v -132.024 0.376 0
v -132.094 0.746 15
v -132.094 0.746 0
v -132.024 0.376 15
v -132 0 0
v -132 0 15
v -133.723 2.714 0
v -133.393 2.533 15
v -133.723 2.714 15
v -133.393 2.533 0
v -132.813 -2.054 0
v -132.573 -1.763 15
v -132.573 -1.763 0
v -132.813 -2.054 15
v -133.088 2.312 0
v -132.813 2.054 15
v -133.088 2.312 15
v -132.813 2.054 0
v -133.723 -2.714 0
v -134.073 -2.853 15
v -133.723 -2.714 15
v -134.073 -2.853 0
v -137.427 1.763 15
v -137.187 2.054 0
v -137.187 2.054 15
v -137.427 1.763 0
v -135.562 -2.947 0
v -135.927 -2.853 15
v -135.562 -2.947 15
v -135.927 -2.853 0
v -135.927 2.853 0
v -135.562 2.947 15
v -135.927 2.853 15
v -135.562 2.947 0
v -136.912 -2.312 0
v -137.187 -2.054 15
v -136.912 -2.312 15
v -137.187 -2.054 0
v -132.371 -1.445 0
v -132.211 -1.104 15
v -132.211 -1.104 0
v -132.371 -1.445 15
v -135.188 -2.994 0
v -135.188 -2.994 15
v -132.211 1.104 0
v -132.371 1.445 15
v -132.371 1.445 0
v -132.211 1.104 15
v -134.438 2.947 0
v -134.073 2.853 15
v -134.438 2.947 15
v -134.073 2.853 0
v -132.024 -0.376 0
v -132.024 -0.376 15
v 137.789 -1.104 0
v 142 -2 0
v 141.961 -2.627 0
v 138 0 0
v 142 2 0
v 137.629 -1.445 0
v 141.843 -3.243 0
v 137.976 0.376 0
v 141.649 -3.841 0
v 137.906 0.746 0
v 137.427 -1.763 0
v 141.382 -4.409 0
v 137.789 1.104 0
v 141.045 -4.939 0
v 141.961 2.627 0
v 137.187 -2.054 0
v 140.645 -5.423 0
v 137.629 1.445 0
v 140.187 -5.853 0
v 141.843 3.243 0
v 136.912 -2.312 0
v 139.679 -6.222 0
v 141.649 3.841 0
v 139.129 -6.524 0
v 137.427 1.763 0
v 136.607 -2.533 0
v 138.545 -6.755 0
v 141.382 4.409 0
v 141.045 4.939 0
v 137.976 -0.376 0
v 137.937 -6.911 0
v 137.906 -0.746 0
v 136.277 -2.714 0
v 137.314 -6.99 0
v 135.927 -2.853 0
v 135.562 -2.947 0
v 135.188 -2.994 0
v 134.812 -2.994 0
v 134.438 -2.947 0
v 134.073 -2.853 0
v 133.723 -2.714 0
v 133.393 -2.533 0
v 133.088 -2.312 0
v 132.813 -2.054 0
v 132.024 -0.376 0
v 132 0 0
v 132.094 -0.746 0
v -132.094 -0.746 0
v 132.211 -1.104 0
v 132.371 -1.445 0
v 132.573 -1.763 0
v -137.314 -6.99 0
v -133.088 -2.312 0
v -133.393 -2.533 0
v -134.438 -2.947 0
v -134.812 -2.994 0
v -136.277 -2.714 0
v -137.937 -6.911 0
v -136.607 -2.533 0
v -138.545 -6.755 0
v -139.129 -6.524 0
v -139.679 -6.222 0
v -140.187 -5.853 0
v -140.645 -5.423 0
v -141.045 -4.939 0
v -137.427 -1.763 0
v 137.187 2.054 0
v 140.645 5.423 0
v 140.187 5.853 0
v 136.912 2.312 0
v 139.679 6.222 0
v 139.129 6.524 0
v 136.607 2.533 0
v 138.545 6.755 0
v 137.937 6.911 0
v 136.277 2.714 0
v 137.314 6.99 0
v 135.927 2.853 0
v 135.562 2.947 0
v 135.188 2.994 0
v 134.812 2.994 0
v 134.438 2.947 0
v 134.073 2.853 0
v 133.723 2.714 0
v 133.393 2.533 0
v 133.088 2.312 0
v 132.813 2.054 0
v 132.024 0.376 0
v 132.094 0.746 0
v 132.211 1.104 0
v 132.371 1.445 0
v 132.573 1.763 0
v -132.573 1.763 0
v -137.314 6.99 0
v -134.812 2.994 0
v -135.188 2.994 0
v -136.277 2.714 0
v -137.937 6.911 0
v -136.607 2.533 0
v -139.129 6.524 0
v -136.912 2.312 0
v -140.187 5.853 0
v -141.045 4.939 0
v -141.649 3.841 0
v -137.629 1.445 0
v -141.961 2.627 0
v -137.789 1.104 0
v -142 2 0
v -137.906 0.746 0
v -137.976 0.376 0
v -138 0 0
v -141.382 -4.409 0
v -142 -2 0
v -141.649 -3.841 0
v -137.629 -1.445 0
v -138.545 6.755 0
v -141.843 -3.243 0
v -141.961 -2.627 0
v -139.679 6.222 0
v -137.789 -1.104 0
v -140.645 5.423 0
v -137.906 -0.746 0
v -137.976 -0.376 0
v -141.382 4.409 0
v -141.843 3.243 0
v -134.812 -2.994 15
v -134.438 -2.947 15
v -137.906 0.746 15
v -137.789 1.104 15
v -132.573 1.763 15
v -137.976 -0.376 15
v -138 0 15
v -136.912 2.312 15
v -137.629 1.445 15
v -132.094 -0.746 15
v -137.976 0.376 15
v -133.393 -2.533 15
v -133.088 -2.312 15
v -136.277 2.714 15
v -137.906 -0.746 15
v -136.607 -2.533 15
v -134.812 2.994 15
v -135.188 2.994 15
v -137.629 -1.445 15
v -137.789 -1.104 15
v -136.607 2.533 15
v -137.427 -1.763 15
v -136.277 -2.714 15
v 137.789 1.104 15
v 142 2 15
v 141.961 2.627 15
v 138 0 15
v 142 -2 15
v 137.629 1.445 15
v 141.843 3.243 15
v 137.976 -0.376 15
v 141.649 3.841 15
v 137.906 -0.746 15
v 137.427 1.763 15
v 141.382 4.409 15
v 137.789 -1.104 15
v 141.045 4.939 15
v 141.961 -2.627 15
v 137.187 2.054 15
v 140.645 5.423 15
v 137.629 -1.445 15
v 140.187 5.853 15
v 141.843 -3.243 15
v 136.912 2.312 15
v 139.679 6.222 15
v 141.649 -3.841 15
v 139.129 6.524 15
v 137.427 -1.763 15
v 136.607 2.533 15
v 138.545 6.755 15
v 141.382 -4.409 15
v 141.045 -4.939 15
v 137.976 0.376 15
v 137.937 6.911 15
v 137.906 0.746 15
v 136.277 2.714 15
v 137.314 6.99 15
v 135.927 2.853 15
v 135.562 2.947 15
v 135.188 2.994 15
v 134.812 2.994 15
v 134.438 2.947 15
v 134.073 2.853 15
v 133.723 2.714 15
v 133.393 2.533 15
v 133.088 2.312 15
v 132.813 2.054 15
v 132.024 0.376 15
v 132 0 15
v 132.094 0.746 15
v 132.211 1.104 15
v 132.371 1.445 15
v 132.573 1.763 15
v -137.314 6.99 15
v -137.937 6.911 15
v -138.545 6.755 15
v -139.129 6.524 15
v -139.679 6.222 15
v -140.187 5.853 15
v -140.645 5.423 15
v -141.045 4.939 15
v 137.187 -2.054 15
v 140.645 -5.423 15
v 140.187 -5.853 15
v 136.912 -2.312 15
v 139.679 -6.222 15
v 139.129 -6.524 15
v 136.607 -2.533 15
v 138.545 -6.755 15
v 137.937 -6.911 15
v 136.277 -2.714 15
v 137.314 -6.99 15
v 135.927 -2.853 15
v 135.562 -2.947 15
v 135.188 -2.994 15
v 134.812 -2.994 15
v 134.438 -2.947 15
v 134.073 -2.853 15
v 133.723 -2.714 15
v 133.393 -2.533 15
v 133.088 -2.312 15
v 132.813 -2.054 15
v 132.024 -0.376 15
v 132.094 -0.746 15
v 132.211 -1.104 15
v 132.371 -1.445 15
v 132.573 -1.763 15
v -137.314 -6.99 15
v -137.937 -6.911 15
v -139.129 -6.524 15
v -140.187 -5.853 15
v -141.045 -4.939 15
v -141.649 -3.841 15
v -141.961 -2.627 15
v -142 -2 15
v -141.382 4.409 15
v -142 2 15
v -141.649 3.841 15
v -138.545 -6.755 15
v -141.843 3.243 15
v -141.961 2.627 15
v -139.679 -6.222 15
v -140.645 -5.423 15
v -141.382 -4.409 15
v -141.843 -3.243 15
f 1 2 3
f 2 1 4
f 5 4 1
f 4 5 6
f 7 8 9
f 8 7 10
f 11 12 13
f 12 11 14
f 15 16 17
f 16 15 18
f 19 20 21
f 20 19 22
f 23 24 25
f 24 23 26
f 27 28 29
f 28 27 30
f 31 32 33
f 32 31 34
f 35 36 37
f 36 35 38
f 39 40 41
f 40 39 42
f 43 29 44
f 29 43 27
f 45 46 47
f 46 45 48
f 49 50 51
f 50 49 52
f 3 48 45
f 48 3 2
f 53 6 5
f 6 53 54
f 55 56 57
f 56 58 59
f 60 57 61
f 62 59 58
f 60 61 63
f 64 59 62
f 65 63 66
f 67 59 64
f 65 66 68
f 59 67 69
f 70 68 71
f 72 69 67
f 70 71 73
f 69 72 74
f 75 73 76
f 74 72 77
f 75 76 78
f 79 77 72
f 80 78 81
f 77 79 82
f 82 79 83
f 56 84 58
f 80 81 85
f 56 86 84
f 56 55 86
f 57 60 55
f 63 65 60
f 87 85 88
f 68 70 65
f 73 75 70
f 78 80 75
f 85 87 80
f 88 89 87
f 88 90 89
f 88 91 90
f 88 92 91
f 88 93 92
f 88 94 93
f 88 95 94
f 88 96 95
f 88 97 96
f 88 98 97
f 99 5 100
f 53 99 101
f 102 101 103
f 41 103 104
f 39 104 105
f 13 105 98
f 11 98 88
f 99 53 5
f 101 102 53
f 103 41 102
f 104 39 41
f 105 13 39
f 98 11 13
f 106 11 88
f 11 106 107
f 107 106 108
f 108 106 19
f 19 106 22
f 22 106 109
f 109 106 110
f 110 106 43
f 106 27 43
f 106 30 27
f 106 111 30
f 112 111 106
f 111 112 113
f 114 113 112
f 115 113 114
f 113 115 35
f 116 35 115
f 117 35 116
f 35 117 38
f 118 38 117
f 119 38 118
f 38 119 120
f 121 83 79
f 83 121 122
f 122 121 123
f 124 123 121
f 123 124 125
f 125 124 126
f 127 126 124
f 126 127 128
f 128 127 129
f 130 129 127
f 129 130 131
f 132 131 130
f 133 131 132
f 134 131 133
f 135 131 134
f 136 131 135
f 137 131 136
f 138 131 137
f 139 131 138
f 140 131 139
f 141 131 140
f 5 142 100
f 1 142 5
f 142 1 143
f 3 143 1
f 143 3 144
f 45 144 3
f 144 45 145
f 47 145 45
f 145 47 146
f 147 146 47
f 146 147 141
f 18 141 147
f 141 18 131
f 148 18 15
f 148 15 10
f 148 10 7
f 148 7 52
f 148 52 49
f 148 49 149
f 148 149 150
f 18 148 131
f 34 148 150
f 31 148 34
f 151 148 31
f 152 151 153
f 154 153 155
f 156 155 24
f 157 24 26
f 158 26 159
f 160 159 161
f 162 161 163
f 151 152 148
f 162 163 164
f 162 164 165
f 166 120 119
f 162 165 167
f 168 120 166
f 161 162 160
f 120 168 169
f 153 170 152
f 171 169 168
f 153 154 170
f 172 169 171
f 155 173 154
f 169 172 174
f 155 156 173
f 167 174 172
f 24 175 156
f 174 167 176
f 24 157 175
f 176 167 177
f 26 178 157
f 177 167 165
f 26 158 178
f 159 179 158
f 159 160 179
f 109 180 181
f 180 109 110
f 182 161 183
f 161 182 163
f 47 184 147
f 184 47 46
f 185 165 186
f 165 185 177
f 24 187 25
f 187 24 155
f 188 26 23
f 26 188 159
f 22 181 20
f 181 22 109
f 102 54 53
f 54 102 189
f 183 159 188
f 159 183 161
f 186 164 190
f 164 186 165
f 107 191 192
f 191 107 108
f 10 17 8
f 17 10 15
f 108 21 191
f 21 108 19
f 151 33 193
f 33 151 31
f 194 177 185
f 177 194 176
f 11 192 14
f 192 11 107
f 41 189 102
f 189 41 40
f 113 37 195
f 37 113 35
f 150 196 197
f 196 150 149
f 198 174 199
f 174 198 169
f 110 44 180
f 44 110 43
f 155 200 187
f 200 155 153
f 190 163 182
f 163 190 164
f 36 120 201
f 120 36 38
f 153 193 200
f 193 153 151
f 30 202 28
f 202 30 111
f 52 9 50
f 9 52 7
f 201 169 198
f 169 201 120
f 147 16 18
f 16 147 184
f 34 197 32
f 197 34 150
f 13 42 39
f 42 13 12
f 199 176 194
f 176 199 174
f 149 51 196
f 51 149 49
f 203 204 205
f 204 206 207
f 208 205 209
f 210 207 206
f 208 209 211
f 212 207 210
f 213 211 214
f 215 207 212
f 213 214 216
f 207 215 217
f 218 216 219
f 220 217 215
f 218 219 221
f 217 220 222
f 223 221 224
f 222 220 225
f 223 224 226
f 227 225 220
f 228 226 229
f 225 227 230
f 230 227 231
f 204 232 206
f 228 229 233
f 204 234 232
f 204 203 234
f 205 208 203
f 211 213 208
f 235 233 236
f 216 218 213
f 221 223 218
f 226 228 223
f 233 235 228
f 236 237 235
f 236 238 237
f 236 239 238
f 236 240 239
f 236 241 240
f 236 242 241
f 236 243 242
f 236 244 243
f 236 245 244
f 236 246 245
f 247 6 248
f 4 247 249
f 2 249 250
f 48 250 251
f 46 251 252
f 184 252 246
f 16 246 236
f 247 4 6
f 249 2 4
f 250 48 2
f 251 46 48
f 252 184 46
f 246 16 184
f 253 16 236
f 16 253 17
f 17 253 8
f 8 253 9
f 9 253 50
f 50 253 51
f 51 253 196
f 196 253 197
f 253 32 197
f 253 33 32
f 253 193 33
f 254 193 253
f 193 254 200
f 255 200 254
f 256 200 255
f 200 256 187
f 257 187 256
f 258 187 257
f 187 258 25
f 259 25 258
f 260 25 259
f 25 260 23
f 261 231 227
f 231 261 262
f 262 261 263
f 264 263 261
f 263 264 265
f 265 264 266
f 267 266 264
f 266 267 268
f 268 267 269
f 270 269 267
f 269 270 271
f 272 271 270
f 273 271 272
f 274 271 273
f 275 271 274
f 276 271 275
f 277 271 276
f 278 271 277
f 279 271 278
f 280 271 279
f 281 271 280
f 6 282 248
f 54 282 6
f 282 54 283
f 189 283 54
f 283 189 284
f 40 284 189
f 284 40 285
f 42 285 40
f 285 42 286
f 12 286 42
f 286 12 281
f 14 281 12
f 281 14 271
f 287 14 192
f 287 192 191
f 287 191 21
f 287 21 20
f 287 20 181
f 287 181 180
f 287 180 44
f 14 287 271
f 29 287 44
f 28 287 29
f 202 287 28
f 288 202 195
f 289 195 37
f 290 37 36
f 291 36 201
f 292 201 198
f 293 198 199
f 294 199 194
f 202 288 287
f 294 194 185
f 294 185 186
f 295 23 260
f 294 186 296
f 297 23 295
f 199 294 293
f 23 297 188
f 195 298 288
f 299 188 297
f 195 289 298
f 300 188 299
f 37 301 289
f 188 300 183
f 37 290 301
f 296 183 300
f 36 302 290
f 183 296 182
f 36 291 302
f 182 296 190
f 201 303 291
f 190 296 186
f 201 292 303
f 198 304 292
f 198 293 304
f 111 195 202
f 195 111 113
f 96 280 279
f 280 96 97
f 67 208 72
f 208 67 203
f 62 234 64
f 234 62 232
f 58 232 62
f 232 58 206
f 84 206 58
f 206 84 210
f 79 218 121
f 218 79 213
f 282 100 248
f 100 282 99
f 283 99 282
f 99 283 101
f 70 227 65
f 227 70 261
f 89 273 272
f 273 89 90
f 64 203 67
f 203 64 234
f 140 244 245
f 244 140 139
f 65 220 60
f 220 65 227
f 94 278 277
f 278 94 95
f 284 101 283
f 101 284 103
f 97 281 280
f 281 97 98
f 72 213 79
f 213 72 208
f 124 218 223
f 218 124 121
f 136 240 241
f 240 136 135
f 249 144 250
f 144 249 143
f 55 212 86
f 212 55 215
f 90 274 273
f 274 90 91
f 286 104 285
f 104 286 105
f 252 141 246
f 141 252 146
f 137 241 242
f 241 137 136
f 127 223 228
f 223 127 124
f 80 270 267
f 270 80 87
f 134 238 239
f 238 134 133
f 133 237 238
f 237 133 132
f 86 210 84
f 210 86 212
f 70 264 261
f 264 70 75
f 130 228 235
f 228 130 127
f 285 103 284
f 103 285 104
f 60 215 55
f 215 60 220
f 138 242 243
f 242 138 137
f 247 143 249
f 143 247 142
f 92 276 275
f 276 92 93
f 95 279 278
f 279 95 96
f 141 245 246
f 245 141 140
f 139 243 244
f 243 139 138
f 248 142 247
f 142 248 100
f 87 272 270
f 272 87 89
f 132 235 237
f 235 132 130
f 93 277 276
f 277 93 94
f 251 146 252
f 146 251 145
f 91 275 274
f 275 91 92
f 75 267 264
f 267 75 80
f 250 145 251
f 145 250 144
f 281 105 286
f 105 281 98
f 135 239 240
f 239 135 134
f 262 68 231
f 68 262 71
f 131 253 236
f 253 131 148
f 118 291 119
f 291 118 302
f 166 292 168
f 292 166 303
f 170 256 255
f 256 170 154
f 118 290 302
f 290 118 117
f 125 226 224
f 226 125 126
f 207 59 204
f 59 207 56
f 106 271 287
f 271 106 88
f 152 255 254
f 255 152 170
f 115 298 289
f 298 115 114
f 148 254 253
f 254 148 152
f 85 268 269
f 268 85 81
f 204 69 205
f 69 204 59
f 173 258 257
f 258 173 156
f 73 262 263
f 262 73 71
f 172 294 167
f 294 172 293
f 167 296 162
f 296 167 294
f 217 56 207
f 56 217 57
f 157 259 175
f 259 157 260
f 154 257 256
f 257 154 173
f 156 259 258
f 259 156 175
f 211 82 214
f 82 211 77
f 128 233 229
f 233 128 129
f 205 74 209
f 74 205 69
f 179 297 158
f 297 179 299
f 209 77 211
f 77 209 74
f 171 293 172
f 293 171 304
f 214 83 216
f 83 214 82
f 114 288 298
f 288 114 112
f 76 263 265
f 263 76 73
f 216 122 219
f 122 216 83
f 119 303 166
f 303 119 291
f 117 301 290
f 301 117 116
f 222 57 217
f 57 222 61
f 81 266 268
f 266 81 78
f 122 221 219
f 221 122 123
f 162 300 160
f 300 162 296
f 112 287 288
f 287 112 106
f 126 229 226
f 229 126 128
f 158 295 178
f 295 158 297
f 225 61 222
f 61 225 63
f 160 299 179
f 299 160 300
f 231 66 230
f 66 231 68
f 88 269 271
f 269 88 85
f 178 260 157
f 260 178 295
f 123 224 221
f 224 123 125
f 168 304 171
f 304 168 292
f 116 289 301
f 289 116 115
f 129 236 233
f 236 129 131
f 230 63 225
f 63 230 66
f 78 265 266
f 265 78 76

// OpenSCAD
$fn = 50;


difference() {
	union() {
		hull() {
			translate(v = [-137.0000000000, 2.0000000000, 0]) {
				cylinder(h = 15, r = 5);
			}
			translate(v = [137.0000000000, 2.0000000000, 0]) {
				cylinder(h = 15, r = 5);
			}
			translate(v = [-137.0000000000, -2.0000000000, 0]) {
				cylinder(h = 15, r = 5);
			}
			translate(v = [137.0000000000, -2.0000000000, 0]) {
				cylinder(h = 15, r = 5);
			}
		}
	}
	union() {
		translate(v = [-135.0000000000, 0.0000000000, 0]) {
			cylinder(h = 15, r = 3.0000000000);
		}
		translate(v = [135.0000000000, 0.0000000000, 0]) {
			cylinder(h = 15, r = 3.0000000000);
		}
		translate(v = [-135.0000000000, 0.0000000000, 0]) {
			cylinder(h = 15, r = 1.5000000000);
		}
		translate(v = [135.0000000000, 0.0000000000, 0]) {
			cylinder(h = 15, r = 1.5000000000);
		}
		translate(v = [-135.0000000000, 0.0000000000, 0]) {
			cylinder(h = 15, r = 1.5000000000);
		}
		translate(v = [135.0000000000, 0.0000000000, 0]) {
			cylinder(h = 15, r = 1.5000000000);
		}
		translate(v = [-135.0000000000, 0.0000000000, 0]) {
			cylinder(h = 15, r = 1.5000000000);
		}
		translate(v = [135.0000000000, 0.0000000000, 0]) {
			cylinder(h = 15, r = 1.5000000000);
		}
	}
}
